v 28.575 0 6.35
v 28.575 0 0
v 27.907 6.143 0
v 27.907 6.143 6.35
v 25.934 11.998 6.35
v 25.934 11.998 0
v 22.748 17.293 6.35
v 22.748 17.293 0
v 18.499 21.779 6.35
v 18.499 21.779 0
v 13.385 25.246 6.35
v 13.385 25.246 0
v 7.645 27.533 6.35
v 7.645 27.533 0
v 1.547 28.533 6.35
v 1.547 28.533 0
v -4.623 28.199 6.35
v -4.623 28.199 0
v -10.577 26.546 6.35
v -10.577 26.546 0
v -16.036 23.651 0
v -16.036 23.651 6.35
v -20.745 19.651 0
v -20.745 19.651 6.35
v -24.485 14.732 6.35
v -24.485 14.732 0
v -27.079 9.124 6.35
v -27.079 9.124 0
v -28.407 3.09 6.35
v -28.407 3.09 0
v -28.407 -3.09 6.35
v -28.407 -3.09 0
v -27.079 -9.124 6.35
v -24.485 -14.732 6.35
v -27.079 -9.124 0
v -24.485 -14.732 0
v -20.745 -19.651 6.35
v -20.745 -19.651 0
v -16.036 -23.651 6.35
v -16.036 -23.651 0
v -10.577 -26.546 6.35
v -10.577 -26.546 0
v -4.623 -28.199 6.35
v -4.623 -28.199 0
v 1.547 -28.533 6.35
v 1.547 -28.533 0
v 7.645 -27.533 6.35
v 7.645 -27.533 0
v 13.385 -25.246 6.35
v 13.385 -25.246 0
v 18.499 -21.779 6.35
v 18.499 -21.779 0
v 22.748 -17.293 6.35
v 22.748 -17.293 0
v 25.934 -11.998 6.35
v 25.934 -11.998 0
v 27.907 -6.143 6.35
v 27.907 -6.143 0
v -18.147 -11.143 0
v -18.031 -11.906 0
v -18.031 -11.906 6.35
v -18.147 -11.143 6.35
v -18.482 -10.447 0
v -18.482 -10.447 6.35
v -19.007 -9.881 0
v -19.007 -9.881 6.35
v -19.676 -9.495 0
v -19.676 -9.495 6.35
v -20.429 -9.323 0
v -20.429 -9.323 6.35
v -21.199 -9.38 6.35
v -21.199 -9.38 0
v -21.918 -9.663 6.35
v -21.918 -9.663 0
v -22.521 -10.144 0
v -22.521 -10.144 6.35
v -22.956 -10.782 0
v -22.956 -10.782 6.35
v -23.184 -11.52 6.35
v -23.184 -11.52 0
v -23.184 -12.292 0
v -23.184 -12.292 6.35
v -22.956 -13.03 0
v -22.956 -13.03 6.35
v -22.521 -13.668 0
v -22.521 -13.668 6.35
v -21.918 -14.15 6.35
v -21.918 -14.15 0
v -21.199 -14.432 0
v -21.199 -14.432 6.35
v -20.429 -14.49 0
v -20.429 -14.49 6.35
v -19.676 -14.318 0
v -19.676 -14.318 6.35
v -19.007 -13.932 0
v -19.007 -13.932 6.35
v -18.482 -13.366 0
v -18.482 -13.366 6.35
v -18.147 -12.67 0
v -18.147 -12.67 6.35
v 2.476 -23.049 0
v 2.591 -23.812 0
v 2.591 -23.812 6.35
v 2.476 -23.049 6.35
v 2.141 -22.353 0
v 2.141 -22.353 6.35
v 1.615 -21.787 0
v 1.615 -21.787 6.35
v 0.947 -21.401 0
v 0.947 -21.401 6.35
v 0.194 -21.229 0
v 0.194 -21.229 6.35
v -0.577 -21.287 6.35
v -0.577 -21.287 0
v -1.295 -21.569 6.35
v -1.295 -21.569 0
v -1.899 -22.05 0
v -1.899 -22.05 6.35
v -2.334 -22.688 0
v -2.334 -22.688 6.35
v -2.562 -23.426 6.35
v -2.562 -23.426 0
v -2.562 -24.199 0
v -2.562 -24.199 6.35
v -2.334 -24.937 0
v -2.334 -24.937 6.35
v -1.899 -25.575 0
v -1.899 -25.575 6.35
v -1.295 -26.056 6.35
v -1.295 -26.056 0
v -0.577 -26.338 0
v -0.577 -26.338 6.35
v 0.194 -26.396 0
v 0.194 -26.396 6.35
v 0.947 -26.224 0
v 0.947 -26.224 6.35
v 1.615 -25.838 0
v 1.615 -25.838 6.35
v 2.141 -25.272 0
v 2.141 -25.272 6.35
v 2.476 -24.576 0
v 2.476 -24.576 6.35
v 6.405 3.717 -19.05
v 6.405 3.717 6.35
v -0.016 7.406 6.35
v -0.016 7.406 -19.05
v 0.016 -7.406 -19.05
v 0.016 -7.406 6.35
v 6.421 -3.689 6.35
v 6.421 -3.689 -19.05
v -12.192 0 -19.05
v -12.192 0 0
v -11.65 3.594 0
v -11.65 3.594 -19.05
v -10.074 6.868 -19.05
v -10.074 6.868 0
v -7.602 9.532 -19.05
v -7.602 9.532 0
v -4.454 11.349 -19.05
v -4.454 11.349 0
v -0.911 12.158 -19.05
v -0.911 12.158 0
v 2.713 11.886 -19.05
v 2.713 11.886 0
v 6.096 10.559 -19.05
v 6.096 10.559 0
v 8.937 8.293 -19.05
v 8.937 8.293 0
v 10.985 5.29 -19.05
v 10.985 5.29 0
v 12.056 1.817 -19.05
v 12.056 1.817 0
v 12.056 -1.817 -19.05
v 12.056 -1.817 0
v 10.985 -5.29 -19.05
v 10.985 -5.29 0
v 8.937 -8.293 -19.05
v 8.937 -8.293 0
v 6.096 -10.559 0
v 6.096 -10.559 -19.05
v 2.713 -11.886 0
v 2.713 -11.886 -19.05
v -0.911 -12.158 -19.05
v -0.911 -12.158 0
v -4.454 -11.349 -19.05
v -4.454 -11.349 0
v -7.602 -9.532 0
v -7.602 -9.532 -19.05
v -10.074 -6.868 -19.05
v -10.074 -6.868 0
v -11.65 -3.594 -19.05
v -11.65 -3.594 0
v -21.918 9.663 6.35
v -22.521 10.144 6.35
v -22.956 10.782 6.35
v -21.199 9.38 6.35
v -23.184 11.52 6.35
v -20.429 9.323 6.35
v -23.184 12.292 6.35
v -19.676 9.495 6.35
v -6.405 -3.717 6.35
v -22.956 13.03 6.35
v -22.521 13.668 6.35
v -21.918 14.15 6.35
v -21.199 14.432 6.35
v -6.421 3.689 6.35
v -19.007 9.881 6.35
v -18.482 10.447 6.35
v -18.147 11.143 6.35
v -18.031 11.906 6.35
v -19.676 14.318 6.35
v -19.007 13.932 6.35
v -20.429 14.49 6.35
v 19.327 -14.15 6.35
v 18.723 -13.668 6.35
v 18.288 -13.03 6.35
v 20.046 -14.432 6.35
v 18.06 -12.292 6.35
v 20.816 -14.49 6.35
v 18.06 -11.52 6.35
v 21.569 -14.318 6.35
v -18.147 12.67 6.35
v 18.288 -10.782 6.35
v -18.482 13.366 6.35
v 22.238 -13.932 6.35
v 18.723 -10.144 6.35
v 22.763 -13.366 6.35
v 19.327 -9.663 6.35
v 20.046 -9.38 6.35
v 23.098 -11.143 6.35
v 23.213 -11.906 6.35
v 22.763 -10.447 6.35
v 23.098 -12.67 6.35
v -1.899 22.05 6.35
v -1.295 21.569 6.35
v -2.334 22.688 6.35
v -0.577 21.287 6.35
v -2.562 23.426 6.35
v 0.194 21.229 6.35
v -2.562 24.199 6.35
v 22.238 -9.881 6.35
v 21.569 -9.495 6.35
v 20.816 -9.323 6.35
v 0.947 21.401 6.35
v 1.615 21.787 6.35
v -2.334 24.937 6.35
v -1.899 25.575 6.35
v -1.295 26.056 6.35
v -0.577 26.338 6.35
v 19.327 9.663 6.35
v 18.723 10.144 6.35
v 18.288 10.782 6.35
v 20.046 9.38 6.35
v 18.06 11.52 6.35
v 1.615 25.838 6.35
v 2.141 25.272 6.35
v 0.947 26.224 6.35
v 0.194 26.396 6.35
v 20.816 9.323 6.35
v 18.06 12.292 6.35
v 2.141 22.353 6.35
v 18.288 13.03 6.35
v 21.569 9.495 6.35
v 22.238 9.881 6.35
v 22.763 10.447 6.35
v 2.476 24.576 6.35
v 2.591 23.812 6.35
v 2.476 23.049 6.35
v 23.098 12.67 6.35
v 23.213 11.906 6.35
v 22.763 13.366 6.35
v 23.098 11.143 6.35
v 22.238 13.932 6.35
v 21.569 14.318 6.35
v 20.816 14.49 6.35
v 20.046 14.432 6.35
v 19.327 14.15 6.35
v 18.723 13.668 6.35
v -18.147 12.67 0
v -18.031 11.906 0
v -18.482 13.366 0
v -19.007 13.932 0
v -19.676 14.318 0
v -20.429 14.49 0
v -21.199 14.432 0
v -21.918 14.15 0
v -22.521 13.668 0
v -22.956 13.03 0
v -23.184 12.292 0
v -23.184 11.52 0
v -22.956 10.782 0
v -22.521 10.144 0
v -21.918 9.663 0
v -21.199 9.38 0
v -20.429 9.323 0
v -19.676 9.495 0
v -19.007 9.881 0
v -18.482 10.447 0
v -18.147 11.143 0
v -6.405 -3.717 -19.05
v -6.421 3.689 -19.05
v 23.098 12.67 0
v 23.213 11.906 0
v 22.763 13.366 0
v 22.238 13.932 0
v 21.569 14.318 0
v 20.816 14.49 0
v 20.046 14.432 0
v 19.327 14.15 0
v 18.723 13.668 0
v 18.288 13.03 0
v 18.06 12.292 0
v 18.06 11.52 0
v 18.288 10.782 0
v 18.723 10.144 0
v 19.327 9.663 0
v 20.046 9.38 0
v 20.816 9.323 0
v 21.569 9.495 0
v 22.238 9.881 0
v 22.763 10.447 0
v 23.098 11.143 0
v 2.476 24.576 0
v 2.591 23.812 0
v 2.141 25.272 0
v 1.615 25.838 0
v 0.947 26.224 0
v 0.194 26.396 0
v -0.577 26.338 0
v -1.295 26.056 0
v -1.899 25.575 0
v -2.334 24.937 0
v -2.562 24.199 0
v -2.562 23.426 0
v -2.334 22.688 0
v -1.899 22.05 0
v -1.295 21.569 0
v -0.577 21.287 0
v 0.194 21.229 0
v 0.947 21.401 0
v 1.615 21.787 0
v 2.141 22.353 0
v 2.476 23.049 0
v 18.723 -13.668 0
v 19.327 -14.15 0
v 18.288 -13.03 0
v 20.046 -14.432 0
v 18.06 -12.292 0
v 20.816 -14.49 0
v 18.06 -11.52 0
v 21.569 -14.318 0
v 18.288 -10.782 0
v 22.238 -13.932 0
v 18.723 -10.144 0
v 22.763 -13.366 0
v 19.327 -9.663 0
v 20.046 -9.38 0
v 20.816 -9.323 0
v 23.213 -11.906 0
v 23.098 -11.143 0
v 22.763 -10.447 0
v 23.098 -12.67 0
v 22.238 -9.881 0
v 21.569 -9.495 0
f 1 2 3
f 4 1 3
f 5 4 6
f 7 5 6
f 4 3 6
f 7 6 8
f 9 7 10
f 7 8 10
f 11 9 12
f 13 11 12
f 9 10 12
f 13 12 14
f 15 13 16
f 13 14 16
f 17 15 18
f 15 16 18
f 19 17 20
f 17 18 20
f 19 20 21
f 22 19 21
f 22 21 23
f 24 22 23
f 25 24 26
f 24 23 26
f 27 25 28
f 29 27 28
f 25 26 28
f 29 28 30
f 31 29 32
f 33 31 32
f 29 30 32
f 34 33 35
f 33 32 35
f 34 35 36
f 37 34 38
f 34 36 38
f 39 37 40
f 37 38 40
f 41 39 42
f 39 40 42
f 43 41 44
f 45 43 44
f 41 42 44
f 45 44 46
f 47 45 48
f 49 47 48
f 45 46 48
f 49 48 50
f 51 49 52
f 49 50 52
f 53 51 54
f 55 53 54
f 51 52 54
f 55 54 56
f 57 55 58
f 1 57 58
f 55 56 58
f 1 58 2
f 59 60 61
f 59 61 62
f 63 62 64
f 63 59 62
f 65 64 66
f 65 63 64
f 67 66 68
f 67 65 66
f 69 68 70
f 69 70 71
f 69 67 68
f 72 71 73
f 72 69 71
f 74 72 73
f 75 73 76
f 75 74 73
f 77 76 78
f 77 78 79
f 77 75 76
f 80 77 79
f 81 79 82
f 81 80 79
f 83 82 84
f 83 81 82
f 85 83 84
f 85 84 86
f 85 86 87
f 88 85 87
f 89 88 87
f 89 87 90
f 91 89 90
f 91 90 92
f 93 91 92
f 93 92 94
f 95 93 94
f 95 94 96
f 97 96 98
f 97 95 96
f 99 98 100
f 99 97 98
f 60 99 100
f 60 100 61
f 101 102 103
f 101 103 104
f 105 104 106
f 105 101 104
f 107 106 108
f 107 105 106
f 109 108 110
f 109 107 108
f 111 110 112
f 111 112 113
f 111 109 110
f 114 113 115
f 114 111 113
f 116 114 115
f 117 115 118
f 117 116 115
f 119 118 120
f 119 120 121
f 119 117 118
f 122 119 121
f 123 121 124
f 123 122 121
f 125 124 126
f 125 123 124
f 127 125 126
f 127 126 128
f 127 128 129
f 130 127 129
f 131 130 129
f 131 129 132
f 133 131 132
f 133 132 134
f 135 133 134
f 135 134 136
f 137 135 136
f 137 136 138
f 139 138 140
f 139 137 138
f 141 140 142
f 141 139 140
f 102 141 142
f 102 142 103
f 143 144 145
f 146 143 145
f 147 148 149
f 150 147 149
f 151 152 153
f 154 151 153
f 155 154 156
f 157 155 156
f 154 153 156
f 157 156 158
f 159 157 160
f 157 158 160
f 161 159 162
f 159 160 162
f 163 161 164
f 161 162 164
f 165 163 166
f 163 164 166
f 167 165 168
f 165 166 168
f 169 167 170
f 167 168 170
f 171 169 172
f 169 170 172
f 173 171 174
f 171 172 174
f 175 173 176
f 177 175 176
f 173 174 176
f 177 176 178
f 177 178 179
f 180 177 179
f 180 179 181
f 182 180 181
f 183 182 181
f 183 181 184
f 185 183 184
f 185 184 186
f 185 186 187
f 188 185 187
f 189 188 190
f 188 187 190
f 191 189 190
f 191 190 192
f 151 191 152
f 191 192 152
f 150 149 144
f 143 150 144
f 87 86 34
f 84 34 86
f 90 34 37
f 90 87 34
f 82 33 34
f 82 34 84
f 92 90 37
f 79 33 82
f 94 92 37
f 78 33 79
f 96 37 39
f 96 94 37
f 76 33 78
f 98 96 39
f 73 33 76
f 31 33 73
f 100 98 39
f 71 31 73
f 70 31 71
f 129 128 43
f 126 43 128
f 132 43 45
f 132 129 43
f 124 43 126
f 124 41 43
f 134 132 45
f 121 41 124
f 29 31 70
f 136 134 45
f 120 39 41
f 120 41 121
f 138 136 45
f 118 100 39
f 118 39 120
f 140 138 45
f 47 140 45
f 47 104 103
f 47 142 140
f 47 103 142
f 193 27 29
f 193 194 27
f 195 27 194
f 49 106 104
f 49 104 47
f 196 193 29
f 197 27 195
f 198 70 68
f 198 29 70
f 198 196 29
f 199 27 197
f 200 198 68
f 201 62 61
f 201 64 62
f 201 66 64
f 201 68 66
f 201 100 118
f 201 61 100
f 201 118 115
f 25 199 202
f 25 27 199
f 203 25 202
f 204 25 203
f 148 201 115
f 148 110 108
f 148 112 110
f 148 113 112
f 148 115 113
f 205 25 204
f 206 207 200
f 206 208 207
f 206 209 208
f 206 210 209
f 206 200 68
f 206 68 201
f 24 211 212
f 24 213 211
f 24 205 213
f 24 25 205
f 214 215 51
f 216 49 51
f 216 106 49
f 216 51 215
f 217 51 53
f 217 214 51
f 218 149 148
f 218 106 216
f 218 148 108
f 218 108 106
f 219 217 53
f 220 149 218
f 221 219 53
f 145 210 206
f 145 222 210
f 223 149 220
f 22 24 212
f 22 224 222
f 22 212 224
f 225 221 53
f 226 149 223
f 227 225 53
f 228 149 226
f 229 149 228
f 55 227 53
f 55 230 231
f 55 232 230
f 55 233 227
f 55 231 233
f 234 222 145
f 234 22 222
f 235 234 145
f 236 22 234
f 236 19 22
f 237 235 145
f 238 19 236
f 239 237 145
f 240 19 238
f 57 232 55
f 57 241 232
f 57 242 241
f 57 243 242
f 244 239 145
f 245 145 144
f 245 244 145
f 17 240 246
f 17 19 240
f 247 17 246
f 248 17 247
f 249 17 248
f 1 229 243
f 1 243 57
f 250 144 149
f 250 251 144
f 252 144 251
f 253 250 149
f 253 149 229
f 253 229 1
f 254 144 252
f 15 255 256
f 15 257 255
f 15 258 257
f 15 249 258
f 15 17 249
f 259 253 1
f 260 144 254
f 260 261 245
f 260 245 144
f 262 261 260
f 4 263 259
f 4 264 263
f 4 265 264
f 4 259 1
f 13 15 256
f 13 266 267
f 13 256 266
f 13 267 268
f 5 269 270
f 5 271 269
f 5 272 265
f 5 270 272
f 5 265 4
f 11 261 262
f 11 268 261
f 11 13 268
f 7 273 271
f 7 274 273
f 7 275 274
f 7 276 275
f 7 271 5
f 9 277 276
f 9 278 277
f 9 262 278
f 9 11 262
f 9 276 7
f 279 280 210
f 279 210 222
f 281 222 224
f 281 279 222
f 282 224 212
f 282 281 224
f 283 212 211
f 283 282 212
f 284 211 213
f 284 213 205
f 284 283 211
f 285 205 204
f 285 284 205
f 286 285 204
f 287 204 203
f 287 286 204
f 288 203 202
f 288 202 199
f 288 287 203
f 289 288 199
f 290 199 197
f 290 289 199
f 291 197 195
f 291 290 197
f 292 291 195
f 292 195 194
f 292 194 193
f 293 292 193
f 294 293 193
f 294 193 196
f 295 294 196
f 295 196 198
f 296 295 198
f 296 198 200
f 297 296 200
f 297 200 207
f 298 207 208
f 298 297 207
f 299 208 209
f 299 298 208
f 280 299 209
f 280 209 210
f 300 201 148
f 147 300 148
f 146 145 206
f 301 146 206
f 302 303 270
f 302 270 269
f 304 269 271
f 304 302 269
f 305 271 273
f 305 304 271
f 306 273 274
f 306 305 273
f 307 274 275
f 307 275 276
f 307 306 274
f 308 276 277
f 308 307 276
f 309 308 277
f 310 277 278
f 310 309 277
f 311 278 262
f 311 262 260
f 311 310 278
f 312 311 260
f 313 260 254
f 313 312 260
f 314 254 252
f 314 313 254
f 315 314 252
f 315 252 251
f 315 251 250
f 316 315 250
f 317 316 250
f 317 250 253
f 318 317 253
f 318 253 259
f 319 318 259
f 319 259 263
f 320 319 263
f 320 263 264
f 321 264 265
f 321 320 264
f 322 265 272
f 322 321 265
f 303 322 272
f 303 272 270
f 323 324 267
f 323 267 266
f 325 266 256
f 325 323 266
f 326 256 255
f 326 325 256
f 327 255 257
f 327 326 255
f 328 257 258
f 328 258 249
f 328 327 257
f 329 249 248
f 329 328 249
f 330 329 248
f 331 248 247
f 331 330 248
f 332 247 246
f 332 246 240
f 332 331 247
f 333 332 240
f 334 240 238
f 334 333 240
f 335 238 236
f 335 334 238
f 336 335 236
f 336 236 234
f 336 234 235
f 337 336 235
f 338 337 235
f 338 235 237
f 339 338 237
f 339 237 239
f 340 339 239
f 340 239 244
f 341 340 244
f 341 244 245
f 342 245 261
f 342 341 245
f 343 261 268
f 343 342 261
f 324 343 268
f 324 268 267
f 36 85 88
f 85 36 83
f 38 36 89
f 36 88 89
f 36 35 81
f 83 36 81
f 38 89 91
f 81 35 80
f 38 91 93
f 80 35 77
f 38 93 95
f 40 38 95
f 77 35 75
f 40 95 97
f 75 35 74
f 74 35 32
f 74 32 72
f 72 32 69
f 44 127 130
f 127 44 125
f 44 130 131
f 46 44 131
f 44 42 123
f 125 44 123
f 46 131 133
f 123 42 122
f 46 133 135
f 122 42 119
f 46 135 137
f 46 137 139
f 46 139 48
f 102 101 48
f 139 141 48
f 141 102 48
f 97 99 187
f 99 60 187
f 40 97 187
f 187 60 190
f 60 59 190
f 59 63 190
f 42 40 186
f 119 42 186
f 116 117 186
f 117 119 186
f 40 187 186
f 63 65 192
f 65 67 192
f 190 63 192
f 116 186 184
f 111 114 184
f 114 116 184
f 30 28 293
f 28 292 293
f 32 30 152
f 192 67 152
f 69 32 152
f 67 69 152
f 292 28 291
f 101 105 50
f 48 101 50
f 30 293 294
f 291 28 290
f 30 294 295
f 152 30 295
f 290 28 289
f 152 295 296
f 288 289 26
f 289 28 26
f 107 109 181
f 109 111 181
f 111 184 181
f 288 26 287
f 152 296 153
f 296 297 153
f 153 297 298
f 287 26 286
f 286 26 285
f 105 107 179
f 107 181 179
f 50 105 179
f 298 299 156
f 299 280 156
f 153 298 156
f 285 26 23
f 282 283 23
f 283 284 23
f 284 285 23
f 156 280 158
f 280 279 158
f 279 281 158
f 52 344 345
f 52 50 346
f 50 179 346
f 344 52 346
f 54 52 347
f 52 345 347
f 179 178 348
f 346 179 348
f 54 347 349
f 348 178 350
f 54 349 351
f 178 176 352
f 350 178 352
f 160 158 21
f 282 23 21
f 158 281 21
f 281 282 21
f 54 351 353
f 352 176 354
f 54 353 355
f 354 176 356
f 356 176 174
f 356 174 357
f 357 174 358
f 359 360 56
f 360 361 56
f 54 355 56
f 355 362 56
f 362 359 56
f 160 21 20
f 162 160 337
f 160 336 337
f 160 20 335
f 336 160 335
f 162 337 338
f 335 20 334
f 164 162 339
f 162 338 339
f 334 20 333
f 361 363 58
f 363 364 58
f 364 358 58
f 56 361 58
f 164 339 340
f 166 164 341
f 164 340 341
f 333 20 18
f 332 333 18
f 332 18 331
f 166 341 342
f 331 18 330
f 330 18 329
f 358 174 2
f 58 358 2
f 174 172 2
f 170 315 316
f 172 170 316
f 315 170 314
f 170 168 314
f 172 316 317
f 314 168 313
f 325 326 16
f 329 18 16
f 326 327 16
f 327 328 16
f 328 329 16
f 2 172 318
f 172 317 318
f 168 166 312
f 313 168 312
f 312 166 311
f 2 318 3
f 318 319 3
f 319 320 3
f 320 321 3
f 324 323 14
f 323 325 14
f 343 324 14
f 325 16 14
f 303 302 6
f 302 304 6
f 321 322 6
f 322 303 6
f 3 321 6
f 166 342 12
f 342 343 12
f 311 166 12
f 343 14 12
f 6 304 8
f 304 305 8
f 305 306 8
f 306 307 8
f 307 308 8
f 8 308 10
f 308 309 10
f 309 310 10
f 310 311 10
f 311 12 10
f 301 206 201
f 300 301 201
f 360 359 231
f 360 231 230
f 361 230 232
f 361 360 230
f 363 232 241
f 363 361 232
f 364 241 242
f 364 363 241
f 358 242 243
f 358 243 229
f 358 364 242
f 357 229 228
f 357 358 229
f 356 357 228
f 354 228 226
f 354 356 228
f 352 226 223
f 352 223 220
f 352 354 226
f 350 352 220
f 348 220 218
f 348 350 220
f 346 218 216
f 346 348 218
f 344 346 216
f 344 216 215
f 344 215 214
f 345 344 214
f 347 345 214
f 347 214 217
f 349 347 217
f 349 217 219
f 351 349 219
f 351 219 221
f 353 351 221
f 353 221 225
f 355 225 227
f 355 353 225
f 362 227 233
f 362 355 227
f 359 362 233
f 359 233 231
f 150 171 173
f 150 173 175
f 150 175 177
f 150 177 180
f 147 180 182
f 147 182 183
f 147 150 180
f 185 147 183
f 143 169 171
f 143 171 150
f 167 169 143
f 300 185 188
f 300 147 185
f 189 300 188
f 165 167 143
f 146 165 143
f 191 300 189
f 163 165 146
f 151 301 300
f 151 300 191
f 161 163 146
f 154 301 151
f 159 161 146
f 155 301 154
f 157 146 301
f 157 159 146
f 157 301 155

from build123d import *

# Parameters (mm, degrees)
SKETCH1_R           = 28.575
SKETCH1_R_2         = 2.5908
BOSS_EXTRUDE1_DEPTH = 6.35
SKETCH2_R           = 12.192
BOSS_EXTRUDE2_DEPTH = 19.05
CUT_EXTRUDE1_DEPTH  = 26.4


with BuildPart() as part:
    # Sketch1 → Boss-Extrude1 (new body)
    with BuildSketch(Plane.XY):
        Circle(SKETCH1_R)
        with Locations((0, 23.8125)):
            Circle(SKETCH1_R_2, mode=Mode.SUBTRACT)
        with Locations((20.622229928, 11.90625)):
            Circle(SKETCH1_R_2, mode=Mode.SUBTRACT)
        with Locations((20.622229928, -11.90625)):
            Circle(SKETCH1_R_2, mode=Mode.SUBTRACT)
        with Locations((0, -23.8125)):
            Circle(SKETCH1_R_2, mode=Mode.SUBTRACT)
        with Locations((-20.622229928, -11.90625)):
            Circle(SKETCH1_R_2, mode=Mode.SUBTRACT)
        with Locations((-20.622229928, 11.90625)):
            Circle(SKETCH1_R_2, mode=Mode.SUBTRACT)
    extrude(amount=BOSS_EXTRUDE1_DEPTH)

    # Sketch2 → Boss-Extrude2 (add)
    with BuildSketch(Plane(origin=(0, 0, 0), x_dir=(-1, 0, 0), z_dir=(0, 0, -1))):
        Circle(SKETCH2_R)
    extrude(amount=BOSS_EXTRUDE2_DEPTH)

    # Sketch3 → Cut-Extrude1 (cut, through all)
    with BuildSketch(Plane.XY.offset(6.35)):
        Polygon((6.42148496, -3.688971027), (6.405485103, 3.716683592), (-0.015999857, 7.405654619), (-6.42148496, 3.688971027), (-6.405485103, -3.716683592), (0.015999857, -7.405654619), align=None)
    extrude(amount=-CUT_EXTRUDE1_DEPTH, mode=Mode.SUBTRACT)


solid = part.part
